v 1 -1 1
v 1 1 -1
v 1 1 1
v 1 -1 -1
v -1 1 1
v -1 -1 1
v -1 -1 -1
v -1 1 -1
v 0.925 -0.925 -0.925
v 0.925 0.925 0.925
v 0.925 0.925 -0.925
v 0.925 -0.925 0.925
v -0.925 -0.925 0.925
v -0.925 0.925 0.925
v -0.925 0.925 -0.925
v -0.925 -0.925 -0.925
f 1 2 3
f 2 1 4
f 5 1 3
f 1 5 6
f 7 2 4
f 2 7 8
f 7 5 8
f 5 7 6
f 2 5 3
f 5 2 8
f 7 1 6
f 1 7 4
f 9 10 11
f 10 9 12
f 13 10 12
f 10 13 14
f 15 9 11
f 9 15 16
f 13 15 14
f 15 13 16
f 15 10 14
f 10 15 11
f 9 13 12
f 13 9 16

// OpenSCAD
// cubo dentro de cubo

difference() {
    cube([2,2,2],true);
    cube([1.85,1.85,1.85],true);
}

//translate([-1,-1, 1]) color("red") cube([0.2,0.2,0.2],true);
//translate([1, 1, 1]) color("green") cube([0.2,0.2,0.2],true);
//translate([1,-1, 1]) color("gray") cube([0.2,0.2,0.2],true);
